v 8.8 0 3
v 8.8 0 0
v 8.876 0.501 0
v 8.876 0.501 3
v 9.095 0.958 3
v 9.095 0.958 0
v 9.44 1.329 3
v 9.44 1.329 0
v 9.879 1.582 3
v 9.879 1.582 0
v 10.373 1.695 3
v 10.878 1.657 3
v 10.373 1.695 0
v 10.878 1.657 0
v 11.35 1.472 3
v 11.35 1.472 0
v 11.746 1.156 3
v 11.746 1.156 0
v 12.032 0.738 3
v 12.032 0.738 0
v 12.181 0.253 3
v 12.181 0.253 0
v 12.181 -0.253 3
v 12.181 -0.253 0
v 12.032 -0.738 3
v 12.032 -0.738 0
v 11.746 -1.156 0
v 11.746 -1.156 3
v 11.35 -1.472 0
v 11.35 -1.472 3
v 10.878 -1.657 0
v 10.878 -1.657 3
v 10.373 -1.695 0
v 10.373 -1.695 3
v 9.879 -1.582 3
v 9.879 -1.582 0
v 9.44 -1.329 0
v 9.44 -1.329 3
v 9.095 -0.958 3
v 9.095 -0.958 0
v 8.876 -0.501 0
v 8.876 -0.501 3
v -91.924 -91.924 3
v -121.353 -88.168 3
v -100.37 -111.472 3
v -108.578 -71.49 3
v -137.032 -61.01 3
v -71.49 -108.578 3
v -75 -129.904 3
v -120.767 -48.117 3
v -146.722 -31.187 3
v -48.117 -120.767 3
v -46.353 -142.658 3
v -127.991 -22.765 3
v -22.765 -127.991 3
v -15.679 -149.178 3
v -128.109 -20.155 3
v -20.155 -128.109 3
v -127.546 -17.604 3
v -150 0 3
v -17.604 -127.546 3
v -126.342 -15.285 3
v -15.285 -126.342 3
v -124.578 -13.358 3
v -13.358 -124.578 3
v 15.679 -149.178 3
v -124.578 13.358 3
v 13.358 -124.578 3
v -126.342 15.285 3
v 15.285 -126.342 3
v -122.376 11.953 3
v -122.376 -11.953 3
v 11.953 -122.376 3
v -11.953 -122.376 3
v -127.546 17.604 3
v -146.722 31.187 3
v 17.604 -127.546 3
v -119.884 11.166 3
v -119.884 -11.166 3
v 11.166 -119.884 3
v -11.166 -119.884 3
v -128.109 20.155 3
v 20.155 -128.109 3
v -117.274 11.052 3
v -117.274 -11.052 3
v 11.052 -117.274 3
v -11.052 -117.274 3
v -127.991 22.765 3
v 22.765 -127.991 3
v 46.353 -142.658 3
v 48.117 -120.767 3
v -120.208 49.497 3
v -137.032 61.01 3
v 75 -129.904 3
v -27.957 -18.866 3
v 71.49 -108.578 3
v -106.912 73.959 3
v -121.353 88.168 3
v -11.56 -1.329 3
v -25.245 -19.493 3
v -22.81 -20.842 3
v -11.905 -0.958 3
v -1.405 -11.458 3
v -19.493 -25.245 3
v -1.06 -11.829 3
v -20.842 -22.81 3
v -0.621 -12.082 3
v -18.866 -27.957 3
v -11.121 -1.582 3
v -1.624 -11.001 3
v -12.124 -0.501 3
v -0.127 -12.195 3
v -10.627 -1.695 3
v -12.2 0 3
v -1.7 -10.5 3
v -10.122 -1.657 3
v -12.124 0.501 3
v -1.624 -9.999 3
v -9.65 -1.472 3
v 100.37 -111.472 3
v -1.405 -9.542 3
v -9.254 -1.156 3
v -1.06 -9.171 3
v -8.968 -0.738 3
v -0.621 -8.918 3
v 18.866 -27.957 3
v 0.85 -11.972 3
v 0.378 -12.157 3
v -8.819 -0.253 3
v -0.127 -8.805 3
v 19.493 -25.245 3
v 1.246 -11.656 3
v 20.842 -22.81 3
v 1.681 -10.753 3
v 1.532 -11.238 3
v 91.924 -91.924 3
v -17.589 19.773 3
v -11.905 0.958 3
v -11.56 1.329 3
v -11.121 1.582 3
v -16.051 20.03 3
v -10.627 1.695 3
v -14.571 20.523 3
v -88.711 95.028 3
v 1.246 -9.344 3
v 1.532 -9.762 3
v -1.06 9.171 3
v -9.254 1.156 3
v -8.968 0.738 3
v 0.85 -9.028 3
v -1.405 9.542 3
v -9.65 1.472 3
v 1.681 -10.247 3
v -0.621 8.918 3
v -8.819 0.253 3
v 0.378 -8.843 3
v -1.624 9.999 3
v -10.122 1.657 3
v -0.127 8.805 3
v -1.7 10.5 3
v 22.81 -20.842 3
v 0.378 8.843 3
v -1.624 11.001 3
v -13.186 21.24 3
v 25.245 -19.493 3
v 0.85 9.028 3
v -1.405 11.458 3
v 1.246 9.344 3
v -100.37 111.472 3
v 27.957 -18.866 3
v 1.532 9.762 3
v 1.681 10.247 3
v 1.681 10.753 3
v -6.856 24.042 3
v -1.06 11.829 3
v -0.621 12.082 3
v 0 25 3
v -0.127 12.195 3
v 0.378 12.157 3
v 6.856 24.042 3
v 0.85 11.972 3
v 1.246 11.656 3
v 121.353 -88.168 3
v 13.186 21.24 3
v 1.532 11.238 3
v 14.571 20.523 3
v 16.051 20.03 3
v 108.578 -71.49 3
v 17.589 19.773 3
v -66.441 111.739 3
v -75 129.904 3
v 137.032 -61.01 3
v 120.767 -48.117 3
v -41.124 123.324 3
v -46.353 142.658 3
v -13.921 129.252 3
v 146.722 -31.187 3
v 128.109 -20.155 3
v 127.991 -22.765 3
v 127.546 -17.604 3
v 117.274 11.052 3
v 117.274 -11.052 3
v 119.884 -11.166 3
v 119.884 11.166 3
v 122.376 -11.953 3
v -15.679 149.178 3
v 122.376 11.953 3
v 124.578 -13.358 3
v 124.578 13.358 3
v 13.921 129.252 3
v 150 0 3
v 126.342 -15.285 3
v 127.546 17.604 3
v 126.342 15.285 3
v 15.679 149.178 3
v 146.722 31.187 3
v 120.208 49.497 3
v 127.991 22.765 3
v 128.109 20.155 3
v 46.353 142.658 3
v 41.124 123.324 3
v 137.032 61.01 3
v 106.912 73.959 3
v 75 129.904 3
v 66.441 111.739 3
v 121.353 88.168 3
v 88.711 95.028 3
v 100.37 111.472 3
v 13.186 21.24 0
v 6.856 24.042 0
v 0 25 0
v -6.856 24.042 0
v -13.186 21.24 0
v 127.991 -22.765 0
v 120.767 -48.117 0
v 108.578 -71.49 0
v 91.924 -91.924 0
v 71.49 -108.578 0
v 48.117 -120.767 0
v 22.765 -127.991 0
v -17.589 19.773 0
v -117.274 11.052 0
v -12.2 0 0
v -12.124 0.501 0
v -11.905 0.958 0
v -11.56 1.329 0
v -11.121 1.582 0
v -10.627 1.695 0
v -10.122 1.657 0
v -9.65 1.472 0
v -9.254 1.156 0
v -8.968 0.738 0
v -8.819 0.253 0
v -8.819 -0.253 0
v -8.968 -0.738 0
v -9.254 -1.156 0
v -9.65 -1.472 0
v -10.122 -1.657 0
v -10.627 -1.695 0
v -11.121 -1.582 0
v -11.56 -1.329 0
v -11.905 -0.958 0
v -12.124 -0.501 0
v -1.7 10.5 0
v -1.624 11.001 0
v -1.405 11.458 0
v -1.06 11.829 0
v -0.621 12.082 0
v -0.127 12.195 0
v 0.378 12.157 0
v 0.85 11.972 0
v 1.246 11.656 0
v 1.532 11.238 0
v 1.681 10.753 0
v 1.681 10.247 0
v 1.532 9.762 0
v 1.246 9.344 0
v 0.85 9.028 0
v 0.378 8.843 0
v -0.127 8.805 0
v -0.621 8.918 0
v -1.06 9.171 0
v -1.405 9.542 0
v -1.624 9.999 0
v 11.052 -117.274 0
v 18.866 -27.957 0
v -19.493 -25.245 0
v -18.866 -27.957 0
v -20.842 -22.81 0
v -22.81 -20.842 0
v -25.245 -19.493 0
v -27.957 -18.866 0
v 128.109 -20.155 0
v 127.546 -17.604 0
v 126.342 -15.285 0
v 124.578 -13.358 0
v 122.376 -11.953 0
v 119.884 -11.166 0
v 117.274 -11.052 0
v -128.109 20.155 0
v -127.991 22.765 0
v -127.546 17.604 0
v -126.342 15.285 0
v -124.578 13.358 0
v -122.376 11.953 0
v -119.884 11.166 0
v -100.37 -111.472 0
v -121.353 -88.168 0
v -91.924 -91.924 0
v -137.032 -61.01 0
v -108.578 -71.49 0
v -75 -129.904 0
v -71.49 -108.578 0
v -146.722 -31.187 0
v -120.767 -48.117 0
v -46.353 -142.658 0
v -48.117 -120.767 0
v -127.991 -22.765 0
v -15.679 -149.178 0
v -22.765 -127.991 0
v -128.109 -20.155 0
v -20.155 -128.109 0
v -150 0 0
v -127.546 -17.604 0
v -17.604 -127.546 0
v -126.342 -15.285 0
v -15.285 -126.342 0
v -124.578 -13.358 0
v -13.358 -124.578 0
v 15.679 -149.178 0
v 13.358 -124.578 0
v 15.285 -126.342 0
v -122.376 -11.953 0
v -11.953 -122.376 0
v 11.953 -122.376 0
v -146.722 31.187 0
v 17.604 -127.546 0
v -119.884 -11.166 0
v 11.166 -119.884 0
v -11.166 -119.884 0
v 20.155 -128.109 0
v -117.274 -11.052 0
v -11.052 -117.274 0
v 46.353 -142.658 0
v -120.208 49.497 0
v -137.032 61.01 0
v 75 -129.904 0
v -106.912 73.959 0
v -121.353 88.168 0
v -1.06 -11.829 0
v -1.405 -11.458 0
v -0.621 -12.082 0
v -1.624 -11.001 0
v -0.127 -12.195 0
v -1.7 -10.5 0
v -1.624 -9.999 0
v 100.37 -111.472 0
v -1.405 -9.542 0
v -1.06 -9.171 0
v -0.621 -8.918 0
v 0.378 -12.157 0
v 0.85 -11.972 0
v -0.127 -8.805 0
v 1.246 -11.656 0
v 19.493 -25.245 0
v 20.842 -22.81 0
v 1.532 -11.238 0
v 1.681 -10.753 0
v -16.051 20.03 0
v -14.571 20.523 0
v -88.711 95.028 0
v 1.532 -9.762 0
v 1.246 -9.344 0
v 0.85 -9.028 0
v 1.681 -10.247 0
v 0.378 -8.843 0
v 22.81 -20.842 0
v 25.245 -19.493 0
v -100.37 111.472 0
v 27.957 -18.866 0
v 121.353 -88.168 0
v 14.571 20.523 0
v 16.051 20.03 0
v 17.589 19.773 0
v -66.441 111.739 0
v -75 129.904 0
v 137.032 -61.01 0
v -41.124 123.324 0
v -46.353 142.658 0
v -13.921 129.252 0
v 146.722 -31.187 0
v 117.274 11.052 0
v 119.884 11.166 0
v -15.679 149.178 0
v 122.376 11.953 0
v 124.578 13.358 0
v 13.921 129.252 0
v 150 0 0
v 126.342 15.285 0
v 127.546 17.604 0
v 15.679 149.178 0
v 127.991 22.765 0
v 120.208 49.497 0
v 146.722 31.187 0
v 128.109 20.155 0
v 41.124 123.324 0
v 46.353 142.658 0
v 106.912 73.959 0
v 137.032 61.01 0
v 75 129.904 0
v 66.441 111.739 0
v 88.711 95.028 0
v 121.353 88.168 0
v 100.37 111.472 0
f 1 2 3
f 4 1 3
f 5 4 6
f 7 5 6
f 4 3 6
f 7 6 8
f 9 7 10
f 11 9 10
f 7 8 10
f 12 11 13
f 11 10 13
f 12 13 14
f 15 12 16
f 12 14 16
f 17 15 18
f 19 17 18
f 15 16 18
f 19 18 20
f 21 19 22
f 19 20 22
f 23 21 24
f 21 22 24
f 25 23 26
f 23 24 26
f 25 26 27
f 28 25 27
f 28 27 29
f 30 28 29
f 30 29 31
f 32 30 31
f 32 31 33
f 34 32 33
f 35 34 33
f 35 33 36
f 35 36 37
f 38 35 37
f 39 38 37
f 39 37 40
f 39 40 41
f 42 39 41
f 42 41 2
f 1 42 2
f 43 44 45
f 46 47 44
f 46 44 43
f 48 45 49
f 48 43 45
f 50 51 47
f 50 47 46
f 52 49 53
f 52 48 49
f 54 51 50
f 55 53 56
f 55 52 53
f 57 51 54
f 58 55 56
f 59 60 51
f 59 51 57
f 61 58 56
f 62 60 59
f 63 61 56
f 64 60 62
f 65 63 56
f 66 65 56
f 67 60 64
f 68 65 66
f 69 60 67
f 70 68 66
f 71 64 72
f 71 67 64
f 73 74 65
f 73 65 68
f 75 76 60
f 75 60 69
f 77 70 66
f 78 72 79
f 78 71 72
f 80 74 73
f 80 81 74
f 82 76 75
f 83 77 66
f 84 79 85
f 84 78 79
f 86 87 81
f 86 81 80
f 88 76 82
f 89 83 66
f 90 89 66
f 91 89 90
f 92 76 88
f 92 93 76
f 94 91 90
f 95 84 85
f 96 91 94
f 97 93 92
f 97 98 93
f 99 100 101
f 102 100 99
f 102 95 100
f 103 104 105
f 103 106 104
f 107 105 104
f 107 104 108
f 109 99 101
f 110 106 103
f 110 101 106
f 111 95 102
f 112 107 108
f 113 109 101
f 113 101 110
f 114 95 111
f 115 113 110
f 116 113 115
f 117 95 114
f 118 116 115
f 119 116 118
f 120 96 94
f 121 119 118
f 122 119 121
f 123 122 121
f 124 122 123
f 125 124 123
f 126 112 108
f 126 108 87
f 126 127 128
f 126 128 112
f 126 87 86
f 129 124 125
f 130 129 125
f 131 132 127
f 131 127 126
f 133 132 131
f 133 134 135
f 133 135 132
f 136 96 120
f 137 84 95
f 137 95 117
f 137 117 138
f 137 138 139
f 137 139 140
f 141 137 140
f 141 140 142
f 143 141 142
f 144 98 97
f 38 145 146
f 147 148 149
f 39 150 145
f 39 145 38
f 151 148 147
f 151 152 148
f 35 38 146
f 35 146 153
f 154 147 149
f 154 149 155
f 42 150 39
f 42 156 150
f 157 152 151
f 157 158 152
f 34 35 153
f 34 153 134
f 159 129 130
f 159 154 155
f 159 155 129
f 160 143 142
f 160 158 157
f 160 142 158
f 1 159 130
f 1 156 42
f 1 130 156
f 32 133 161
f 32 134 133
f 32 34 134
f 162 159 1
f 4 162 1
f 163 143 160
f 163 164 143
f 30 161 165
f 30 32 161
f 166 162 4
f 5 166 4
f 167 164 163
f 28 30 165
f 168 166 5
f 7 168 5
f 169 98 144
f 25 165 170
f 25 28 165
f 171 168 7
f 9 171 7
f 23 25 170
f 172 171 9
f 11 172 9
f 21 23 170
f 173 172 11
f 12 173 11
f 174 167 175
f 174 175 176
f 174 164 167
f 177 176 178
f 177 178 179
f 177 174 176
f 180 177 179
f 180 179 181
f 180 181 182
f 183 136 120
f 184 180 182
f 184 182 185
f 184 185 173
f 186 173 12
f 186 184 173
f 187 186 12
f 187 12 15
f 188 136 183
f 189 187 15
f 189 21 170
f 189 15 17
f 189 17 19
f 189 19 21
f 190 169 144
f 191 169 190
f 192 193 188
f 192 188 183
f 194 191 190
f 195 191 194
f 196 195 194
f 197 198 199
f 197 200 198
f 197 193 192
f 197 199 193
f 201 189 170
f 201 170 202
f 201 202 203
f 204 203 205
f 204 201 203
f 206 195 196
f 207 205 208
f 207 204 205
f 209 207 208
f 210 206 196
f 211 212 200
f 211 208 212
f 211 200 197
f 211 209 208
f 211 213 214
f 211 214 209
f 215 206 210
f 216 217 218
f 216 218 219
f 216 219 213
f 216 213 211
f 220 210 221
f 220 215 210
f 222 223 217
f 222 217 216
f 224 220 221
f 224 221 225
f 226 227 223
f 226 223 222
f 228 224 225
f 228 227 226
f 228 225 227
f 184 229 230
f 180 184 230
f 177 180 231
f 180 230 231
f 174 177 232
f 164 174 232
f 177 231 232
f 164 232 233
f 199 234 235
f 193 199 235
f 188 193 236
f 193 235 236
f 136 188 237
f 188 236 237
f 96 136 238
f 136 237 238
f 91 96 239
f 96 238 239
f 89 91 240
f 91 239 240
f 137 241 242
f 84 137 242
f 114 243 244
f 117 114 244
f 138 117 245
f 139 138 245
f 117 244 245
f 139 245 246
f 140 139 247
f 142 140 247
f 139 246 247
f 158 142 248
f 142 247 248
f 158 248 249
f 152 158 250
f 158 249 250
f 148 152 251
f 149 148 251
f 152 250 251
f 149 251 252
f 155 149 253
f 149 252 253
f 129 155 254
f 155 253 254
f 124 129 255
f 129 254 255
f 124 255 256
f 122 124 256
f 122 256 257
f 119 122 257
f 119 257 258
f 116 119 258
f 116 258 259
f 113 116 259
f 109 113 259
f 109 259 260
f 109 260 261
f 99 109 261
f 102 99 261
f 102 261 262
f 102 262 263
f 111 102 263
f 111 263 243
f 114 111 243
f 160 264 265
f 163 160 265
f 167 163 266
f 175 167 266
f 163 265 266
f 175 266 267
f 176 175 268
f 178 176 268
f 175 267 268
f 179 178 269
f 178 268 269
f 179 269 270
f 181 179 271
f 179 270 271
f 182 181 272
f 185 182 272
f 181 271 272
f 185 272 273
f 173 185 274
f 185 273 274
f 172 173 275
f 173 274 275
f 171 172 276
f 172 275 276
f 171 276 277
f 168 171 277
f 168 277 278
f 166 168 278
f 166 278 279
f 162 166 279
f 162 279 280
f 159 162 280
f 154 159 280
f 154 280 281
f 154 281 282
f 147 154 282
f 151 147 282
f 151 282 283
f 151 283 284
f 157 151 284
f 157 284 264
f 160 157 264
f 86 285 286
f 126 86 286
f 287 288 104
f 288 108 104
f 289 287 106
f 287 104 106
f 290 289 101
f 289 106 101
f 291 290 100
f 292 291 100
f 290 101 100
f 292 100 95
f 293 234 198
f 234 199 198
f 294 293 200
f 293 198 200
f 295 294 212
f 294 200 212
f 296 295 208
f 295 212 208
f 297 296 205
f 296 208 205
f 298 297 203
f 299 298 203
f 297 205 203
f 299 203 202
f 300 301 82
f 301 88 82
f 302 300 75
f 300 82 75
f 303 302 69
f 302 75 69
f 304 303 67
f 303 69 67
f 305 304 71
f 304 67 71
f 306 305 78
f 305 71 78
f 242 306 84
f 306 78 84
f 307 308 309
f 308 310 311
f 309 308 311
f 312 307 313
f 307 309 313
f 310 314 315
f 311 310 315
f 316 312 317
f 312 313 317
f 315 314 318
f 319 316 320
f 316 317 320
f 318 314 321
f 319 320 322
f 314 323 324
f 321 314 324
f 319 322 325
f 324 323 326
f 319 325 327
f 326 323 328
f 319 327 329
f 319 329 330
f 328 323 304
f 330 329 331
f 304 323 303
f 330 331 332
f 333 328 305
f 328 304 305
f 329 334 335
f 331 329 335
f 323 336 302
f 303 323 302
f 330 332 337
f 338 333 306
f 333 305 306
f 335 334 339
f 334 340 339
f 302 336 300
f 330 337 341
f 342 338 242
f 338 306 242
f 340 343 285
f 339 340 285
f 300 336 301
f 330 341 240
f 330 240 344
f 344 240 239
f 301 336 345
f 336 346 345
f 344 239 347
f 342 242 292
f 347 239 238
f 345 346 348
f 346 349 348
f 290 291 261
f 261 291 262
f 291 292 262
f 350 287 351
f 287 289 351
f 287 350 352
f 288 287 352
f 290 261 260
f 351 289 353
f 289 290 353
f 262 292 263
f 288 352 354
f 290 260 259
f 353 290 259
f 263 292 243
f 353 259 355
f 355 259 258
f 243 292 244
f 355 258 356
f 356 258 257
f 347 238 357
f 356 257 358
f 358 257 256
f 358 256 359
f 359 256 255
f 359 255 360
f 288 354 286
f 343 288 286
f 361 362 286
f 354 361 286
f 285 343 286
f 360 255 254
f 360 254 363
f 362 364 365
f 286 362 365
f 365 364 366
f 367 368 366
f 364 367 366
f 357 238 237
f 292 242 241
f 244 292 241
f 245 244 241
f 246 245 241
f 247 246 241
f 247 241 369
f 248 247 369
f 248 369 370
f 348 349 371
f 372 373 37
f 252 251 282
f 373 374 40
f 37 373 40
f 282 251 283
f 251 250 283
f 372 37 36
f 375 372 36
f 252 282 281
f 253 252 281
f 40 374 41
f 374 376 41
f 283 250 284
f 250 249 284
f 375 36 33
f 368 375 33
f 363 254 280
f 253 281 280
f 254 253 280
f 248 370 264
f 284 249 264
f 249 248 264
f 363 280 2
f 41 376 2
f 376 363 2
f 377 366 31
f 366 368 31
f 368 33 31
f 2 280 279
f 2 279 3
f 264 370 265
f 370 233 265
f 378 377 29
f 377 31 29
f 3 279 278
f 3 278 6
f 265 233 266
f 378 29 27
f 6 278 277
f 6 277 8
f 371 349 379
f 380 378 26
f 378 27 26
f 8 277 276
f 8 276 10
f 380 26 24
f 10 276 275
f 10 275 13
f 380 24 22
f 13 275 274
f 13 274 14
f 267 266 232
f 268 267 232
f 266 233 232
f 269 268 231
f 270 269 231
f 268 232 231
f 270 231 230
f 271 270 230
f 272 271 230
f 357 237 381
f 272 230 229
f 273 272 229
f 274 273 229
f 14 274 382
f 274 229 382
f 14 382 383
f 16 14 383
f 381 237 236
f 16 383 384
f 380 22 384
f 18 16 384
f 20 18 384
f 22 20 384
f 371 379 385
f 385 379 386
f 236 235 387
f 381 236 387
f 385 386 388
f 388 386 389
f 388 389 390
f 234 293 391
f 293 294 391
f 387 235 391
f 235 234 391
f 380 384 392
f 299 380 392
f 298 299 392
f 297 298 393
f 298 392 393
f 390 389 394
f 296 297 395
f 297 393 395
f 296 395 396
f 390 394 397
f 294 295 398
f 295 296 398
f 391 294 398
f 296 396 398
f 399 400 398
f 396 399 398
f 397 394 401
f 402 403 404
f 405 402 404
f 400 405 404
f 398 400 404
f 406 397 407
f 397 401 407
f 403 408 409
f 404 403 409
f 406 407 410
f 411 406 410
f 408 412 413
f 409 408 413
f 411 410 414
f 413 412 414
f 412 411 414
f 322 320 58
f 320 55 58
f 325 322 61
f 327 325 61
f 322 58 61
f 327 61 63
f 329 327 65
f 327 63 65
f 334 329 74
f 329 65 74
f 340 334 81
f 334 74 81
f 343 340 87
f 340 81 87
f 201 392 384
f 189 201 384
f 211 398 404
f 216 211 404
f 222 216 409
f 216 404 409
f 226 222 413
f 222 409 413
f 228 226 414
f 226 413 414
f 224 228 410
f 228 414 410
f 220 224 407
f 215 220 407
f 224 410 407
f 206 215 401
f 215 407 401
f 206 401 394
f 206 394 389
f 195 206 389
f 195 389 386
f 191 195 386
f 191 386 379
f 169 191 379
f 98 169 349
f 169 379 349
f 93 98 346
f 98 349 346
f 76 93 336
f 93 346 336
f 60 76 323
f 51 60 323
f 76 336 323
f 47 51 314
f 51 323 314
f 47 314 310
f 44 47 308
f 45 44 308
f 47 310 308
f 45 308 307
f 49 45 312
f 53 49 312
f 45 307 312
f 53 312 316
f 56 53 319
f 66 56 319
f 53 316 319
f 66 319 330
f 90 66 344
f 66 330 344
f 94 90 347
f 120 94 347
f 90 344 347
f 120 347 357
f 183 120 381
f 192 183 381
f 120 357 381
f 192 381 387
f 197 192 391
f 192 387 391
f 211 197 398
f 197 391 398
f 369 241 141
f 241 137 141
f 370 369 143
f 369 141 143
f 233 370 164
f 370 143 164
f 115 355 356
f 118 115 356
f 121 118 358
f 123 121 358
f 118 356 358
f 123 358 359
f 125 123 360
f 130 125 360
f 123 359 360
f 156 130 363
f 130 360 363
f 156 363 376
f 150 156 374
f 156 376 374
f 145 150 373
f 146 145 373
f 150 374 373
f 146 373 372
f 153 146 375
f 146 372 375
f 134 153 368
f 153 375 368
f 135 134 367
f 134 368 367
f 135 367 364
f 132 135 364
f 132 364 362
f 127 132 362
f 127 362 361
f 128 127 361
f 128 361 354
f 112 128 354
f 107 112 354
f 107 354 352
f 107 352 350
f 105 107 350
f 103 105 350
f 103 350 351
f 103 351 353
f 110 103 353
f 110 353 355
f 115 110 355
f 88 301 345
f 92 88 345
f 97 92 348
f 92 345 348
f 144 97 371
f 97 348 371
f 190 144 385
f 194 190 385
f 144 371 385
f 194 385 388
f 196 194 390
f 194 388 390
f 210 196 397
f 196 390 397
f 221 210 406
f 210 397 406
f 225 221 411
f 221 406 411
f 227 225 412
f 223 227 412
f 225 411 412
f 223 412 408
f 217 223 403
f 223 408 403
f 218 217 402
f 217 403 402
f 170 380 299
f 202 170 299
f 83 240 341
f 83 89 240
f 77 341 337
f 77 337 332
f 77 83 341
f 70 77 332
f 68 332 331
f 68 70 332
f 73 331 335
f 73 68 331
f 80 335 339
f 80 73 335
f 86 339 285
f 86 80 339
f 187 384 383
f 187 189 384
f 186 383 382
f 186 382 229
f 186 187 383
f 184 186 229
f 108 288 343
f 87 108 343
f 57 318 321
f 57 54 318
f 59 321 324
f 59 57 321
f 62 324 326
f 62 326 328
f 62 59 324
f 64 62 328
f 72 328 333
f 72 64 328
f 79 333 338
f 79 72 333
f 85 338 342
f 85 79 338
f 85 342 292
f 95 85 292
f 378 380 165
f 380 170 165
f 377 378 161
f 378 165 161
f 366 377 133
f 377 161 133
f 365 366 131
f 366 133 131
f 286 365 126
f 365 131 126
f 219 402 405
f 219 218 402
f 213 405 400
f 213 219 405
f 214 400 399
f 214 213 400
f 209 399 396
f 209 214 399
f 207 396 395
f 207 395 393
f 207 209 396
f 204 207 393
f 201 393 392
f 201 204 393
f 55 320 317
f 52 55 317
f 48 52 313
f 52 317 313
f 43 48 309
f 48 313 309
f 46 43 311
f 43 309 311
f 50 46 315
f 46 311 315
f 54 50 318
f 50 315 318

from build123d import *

# Parameters (mm, degrees)
CROQUIS1_R                   = 150
SALIENTE_EXTRUIR1_DEPTH      = 3
REDONDEO1_R                  = 10
TALADRO_DE_MARGEN_PARA_M31_D = 3.4


with BuildPart() as part:
    # Croquis1 → Saliente-Extruir1 (new body)
    with BuildSketch(Plane.XY):
        Circle(CROQUIS1_R)
        with BuildLine():
            Line((9.972316505, -129.616946822), (19.597749078, -19.597749078))
            Line((19.597749078, -19.597749078), (129.616946822, -9.972316505))
            ThreePointArc((129.616946822, -9.972316505), (91.923881554, -91.923881554), (9.972316505, -129.616946822))
        make_face(mode=Mode.SUBTRACT)
        with BuildLine():
            Line((129.616946822, 9.972316505), (15, 20))
            ThreePointArc((15, 20), (0, 25), (-15, 20))
            Line((-15, 20), (-129.616946822, 9.972316505))
            ThreePointArc((-129.616946822, 9.972316505), (0, 130), (129.616946822, 9.972316505))
        make_face(mode=Mode.SUBTRACT)
        with BuildLine():
            Line((-129.616946822, -9.972316505), (-19.597749078, -19.597749078))
            Line((-19.597749078, -19.597749078), (-9.972316505, -129.616946822))
            ThreePointArc((-9.972316505, -129.616946822), (-91.923881554, -91.923881554), (-129.616946822, -9.972316505))
        make_face(mode=Mode.SUBTRACT)
    extrude(amount=SALIENTE_EXTRUIR1_DEPTH)

    # Redondeo1
    redondeo1_edges = [part.edges().sort_by_distance(p)[0] for p in [
        (-129.616946822, 9.972316505, 1.5),
        (-15, 20, 1.5),
        (15, 20, 1.5),
        (129.616946822, 9.972316505, 1.5),
        (9.972316505, -129.616946822, 1.5),
        (129.616946822, -9.972316505, 1.5),
        (19.597749078, -19.597749078, 1.5),
        (-129.616946822, -9.972316505, 1.5),
        (-9.972316505, -129.616946822, 1.5),
        (-19.597749078, -19.597749078, 1.5),
    ]]
    fillet(redondeo1_edges, radius=REDONDEO1_R)

    # Taladro de margen para M31 (through all)
    with Locations(Plane.XY.offset(3)):
        with Locations((0, 10.5), (10.5, 0), (0, -10.5), (-10.5, 0)):
            Hole(TALADRO_DE_MARGEN_PARA_M31_D / 2)


solid = part.part
